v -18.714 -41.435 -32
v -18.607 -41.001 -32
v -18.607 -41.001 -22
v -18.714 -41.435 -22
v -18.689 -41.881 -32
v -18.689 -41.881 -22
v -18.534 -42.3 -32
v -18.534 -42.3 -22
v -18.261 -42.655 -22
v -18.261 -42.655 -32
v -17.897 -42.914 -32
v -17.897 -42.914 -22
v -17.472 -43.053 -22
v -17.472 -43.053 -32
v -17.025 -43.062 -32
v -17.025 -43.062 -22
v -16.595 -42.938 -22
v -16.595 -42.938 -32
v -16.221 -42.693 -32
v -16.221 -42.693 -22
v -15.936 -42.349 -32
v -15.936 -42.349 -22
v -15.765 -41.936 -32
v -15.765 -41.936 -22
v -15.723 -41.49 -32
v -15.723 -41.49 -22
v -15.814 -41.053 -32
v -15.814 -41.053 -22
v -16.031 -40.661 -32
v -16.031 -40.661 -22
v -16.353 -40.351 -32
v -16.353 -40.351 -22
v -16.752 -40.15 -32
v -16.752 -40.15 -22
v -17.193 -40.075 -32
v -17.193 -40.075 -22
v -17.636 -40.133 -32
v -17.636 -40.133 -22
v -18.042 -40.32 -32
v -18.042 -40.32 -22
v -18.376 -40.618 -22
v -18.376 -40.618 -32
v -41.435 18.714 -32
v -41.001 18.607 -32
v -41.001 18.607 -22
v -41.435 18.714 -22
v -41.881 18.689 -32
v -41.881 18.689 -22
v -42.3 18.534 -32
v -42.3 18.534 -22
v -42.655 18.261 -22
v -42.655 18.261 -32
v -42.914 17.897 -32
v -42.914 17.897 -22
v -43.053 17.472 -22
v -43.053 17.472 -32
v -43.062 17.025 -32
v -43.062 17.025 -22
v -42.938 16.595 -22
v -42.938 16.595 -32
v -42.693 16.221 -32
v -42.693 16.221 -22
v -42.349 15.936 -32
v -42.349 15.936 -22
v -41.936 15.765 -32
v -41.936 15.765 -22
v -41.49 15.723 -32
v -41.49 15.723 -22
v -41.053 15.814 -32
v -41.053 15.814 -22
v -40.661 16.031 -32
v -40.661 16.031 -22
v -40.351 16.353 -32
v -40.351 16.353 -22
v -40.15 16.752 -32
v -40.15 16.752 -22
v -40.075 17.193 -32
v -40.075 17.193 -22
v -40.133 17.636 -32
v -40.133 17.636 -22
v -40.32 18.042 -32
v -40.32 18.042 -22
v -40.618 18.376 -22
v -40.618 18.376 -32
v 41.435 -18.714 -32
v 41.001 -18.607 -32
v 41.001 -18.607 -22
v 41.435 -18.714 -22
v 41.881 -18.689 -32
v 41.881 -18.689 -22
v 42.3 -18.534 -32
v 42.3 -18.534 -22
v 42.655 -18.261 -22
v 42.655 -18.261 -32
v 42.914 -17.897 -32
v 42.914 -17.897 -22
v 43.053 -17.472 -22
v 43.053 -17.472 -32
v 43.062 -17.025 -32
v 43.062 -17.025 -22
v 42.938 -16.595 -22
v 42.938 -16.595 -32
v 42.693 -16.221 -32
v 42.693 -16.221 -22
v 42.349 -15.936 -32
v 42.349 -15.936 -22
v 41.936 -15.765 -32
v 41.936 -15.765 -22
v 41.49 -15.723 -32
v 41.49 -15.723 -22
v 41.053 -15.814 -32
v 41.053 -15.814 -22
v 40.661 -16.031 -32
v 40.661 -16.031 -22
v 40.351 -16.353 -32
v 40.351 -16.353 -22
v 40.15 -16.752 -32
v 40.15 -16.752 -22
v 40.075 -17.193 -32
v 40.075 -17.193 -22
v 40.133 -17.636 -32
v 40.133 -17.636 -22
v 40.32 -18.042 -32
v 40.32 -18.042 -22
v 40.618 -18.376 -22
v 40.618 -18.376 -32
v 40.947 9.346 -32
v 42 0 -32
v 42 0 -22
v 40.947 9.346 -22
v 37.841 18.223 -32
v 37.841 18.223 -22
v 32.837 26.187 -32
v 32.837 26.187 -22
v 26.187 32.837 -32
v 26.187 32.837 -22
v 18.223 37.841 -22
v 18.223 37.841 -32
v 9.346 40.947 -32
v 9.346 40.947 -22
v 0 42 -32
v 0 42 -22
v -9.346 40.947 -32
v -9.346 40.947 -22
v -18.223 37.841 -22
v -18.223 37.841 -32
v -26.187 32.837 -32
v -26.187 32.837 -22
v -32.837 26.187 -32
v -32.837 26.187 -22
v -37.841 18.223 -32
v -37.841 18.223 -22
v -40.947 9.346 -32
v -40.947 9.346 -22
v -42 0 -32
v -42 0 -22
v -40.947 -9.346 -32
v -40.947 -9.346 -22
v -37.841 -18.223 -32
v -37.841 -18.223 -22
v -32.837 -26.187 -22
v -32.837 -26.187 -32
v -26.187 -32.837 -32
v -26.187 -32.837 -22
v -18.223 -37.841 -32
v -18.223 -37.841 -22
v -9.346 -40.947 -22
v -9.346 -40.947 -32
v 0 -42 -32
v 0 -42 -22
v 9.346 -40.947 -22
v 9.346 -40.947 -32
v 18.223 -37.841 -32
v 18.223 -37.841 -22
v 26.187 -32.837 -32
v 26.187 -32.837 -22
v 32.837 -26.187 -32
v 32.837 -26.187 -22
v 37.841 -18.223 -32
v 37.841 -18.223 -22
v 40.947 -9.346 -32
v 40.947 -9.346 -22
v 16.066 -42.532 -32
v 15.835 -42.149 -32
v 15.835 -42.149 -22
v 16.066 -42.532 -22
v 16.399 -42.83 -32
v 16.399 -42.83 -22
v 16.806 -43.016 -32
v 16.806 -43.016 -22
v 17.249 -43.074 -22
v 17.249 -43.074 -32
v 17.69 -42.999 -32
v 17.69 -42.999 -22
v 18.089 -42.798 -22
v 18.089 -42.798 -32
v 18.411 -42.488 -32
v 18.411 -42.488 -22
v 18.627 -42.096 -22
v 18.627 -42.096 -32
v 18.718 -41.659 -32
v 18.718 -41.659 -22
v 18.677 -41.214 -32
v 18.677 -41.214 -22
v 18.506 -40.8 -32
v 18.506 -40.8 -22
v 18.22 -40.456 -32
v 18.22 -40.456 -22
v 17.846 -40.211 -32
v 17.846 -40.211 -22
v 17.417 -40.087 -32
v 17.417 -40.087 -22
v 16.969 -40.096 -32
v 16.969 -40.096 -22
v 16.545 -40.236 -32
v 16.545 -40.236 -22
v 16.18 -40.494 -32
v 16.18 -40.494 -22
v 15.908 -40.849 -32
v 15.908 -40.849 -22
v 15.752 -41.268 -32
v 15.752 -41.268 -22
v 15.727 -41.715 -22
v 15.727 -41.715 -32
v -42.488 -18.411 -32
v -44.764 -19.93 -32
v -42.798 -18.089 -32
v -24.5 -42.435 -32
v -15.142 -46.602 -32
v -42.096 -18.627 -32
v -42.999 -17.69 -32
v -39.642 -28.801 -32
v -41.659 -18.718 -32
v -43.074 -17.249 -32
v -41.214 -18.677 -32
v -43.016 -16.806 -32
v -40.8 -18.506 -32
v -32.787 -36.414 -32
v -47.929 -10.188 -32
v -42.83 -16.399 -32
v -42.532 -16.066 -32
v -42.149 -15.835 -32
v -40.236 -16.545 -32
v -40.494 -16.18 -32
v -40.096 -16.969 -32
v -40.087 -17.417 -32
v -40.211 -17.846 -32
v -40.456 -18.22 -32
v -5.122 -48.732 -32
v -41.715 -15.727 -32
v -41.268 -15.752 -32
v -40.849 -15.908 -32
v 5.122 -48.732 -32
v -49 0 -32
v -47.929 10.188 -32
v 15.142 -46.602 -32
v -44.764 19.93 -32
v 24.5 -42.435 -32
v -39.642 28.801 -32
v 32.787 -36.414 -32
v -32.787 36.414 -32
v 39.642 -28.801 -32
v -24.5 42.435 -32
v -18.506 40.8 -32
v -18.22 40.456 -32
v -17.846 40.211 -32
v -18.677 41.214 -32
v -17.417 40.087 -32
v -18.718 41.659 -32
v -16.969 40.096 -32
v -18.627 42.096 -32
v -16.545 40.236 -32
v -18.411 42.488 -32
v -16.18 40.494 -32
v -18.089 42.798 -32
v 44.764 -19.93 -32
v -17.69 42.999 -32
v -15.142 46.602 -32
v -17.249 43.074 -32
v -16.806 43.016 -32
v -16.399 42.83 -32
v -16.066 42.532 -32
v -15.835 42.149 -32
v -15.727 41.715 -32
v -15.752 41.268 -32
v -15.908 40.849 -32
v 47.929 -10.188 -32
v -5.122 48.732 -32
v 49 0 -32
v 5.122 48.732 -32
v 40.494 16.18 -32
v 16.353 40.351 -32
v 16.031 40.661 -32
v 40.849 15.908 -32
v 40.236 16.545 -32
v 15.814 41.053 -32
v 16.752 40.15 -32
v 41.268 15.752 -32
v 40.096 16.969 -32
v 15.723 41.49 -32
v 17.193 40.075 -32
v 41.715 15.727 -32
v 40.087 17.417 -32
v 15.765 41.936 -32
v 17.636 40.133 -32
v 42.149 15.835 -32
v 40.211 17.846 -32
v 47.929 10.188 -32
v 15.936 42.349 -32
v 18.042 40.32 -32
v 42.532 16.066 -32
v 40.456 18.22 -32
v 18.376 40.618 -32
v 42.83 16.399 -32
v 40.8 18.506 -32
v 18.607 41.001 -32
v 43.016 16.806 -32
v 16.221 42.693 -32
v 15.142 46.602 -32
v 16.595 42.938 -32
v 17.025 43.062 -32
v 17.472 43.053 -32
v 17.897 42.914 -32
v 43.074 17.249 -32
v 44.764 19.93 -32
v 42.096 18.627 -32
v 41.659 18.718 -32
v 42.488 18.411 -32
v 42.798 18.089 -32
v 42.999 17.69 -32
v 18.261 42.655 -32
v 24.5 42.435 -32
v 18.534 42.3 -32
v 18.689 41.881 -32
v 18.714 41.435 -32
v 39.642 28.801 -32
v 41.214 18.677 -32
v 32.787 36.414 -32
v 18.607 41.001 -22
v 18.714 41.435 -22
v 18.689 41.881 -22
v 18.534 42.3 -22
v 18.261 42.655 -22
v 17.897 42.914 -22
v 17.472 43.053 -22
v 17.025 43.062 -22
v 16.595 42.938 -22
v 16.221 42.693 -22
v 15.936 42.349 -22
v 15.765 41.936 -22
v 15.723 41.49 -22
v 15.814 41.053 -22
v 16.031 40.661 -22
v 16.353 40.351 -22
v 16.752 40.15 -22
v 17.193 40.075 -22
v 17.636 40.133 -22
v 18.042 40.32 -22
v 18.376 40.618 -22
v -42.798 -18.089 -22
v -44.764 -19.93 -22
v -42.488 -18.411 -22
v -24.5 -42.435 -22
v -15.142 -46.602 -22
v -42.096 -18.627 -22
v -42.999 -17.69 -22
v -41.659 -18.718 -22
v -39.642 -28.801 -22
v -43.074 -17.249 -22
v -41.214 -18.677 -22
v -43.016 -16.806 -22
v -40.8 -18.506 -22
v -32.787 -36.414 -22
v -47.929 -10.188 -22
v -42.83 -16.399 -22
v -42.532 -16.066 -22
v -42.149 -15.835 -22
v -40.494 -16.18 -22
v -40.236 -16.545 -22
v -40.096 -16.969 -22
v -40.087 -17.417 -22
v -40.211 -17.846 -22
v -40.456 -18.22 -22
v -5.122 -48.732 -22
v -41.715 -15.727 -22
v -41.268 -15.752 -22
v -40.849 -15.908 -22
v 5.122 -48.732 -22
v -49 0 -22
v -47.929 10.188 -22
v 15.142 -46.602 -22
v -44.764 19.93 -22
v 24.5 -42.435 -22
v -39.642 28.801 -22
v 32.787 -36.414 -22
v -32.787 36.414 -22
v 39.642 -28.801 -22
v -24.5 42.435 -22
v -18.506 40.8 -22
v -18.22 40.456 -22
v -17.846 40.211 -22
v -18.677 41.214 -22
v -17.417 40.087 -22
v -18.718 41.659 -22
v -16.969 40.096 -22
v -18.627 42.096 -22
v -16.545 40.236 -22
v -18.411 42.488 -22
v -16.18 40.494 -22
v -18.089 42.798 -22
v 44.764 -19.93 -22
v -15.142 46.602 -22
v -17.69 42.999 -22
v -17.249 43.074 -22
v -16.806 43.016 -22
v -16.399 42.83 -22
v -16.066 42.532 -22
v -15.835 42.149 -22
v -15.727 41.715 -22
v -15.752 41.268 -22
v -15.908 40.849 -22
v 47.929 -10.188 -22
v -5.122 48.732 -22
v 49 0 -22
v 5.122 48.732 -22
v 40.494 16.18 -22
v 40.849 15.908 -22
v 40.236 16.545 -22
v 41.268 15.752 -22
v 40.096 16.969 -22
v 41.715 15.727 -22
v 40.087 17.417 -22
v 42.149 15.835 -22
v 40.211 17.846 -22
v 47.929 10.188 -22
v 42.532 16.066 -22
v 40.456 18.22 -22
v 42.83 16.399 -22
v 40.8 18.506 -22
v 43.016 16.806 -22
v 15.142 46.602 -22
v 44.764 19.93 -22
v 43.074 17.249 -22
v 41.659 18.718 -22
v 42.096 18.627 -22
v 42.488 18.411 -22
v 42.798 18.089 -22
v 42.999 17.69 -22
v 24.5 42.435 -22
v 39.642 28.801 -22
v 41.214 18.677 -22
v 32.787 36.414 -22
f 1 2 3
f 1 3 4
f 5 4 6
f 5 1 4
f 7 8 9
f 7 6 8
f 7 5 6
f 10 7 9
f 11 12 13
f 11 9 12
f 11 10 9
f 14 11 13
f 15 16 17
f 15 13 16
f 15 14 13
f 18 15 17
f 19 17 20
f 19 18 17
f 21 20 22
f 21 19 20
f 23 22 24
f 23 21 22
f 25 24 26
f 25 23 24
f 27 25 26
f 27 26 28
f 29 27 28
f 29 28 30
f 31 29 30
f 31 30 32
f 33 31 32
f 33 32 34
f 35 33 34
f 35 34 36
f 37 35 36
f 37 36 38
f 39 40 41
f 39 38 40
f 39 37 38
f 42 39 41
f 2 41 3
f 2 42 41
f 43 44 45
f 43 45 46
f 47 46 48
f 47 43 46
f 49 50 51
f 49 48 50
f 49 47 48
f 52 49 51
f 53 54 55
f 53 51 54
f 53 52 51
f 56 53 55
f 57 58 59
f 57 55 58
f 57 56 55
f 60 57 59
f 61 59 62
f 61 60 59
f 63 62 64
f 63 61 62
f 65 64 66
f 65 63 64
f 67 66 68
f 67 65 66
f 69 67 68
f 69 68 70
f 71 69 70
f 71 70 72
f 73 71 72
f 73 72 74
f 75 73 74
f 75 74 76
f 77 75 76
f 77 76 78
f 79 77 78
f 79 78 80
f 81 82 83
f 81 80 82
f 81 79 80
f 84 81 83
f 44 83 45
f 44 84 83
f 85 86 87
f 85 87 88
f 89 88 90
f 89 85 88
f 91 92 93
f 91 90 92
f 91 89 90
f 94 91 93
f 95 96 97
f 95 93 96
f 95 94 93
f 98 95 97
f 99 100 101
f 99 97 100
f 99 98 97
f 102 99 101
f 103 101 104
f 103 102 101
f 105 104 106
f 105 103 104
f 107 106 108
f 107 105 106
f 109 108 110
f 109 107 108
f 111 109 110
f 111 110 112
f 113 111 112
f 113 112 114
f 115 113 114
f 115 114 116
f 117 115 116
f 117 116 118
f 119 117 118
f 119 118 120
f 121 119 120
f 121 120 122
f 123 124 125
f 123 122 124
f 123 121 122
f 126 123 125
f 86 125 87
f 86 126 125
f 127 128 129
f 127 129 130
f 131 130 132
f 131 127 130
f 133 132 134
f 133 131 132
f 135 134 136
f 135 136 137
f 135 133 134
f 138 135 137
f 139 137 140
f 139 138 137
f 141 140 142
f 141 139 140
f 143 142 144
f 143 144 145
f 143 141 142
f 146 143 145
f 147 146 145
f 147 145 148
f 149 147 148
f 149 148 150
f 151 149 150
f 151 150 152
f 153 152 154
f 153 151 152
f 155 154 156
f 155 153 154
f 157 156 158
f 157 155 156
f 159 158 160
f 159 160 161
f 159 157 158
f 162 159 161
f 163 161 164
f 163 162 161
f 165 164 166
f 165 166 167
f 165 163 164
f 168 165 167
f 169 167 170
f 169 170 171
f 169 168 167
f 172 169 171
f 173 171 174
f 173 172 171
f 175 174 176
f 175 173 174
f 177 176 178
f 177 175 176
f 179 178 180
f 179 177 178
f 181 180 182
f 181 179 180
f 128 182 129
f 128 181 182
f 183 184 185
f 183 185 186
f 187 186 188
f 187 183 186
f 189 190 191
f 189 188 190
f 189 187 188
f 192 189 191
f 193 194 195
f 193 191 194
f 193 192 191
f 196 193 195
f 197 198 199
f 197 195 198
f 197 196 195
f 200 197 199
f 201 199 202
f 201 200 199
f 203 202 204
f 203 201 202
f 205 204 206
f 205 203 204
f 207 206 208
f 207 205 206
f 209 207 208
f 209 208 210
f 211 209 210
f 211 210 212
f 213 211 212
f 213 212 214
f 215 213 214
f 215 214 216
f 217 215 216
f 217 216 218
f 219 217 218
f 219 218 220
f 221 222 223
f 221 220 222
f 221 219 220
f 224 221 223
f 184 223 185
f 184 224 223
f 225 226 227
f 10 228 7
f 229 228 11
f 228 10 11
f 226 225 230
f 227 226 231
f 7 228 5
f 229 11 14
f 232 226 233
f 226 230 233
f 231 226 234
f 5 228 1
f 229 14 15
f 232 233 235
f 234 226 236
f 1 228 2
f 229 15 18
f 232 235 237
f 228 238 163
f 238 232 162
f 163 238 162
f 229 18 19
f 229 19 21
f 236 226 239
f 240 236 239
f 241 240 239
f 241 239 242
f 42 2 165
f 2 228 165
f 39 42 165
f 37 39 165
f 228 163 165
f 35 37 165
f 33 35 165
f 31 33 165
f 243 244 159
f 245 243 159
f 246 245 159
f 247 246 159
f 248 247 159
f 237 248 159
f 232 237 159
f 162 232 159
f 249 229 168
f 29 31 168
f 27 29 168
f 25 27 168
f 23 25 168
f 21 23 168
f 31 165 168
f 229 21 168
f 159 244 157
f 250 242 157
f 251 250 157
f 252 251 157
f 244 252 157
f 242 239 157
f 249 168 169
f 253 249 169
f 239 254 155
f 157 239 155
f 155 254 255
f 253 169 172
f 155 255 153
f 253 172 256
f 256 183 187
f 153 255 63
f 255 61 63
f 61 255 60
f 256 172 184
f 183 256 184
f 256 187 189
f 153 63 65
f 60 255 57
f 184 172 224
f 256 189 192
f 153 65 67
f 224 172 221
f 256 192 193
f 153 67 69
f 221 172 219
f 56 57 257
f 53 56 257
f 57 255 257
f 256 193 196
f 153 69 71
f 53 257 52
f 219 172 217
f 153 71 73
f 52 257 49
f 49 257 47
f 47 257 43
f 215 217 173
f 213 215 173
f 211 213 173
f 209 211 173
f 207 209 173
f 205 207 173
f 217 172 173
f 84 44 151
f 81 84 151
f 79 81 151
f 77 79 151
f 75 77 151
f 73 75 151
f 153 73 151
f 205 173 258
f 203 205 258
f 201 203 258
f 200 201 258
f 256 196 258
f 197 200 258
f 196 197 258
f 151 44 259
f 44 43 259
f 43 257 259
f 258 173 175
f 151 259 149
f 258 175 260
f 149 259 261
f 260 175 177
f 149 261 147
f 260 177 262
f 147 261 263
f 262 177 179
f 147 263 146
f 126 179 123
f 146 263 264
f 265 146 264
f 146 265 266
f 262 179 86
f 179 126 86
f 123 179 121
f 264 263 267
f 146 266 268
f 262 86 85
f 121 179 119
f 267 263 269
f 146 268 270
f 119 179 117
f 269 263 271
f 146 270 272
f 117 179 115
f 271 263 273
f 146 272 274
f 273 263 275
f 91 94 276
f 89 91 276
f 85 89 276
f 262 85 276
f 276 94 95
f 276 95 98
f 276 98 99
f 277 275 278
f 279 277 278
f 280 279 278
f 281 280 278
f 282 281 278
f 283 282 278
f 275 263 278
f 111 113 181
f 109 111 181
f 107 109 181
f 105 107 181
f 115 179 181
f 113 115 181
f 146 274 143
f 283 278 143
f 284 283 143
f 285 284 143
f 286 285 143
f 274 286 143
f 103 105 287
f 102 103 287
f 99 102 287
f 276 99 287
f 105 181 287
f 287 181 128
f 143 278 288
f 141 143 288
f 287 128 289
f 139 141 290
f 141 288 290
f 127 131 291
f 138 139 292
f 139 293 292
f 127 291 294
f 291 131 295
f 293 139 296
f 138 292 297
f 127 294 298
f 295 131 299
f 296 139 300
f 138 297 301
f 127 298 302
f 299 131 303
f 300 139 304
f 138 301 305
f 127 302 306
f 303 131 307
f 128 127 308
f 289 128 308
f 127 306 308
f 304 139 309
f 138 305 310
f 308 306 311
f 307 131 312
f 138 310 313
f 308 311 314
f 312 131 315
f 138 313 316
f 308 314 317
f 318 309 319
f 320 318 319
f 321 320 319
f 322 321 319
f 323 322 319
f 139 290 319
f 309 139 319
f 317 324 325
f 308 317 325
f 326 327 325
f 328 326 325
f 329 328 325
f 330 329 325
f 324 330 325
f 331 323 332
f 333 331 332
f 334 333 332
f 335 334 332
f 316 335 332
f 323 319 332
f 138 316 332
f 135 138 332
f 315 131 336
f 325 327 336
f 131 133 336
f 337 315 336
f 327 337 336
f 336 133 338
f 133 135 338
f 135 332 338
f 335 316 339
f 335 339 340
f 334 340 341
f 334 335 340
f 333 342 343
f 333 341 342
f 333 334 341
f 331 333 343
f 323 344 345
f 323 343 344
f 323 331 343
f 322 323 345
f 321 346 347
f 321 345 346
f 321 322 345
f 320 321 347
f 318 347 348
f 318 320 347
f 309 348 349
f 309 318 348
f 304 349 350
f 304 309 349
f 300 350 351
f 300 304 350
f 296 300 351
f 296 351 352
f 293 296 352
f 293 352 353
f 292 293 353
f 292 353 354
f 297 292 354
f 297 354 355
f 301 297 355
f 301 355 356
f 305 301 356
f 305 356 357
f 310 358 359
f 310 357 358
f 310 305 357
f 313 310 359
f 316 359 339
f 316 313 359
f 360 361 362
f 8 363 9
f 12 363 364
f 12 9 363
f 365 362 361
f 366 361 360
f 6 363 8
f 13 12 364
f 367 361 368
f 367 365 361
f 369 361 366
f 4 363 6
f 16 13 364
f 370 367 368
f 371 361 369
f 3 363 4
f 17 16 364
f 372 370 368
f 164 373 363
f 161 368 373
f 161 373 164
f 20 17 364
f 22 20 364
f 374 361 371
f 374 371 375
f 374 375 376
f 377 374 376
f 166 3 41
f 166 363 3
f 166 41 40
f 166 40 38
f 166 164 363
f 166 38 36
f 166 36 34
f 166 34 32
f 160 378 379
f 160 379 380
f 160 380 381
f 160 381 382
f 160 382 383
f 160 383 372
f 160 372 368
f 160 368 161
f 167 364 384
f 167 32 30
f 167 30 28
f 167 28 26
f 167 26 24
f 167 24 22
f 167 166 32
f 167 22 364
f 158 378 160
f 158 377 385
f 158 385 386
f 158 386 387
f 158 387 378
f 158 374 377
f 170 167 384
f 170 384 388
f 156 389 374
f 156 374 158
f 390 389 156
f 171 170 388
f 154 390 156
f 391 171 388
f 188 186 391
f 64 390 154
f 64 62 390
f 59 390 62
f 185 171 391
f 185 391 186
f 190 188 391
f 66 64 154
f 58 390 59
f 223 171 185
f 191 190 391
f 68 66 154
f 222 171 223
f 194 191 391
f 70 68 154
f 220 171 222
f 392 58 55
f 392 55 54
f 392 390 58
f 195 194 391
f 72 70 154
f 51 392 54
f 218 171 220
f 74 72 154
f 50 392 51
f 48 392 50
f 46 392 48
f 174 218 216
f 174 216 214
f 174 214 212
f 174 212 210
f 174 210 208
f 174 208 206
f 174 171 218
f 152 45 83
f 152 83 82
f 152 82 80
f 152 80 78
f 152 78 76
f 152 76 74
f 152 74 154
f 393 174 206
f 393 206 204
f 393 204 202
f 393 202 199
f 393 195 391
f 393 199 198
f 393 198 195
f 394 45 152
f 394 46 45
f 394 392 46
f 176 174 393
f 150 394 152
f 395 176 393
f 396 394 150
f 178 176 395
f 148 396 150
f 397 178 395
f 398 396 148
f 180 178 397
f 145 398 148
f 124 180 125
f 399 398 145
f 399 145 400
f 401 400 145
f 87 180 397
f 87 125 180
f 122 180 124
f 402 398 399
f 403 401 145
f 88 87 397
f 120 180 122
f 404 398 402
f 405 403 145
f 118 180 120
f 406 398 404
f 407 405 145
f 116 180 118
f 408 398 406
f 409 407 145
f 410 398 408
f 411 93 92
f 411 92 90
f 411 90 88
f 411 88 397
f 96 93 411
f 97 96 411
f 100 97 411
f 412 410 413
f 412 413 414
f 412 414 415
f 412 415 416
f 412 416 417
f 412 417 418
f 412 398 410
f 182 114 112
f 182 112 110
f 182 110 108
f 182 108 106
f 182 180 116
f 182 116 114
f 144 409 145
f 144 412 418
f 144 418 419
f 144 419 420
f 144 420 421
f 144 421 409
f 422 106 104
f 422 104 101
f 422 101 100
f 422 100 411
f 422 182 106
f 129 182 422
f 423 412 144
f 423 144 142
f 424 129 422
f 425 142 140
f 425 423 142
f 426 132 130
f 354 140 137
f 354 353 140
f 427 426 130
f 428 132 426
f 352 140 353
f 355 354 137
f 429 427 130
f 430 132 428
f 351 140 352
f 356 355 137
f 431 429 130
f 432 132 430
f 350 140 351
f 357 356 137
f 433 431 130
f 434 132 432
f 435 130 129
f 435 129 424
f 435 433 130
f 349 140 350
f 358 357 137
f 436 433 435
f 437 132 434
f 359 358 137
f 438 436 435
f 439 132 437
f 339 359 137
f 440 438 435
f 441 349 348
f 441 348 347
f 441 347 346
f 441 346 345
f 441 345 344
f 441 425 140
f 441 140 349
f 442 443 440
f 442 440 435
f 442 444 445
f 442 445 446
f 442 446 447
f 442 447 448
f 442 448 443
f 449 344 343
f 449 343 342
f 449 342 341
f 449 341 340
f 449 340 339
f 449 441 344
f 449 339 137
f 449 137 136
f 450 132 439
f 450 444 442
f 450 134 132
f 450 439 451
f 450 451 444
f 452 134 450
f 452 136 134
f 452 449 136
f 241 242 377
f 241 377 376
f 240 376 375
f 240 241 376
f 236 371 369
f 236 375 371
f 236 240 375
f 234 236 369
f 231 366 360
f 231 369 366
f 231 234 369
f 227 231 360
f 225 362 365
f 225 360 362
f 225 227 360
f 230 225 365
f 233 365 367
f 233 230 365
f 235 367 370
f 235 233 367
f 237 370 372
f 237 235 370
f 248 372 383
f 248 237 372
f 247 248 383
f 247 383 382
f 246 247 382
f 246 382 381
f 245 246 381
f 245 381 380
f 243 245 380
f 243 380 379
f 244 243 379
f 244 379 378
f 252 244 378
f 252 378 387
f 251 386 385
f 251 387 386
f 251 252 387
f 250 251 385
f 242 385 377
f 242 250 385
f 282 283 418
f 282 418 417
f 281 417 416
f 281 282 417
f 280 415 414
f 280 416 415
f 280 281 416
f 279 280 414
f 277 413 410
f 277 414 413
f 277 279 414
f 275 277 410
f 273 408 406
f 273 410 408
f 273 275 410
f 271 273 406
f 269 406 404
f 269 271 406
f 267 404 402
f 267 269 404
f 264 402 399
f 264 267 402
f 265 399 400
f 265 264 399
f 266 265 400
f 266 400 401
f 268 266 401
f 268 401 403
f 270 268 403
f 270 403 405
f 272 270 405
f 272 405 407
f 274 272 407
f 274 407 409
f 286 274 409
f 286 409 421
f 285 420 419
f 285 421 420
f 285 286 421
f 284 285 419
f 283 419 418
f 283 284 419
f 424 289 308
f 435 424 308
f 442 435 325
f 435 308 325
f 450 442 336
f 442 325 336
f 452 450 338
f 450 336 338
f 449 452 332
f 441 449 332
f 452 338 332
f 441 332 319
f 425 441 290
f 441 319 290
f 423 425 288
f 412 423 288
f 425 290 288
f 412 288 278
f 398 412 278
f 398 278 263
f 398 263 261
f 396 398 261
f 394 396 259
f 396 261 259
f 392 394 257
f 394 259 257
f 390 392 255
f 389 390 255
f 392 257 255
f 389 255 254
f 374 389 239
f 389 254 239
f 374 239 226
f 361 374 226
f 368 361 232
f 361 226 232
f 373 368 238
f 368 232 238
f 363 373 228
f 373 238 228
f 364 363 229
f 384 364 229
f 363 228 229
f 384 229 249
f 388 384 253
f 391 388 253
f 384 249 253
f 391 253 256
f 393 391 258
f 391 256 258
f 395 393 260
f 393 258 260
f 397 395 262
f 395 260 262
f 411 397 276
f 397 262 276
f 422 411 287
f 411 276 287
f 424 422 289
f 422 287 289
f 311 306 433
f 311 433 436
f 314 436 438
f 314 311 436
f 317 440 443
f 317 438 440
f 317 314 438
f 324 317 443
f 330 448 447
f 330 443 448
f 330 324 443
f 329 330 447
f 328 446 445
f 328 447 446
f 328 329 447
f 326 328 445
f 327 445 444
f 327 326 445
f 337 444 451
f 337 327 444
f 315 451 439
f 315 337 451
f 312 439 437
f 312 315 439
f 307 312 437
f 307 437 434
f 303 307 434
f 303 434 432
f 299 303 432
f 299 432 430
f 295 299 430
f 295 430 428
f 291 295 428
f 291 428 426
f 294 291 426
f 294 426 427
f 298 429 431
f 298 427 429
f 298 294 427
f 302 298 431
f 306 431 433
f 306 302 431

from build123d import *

# Parameters (mm, degrees)
CYLINDER662_R               = 1.5
CYLINDER662_DEPTH           = 20
CYLINDER662_PLACEMENT_ANGLE = 45
CYLINDER664_R               = 1.5
CYLINDER664_DEPTH           = 20
CYLINDER661_R               = 1.5
CYLINDER661_DEPTH           = 20
CYLINDER661_PLACEMENT_ANGLE = 135
CYLINDER663_R               = 1.5
CYLINDER663_DEPTH           = 20
CYLINDER667_R               = 1.5
CYLINDER667_DEPTH           = 20
CYLINDER667_PLACEMENT_ANGLE = 225
CYLINDER665_R               = 1.5
CYLINDER665_DEPTH           = 20
CYLINDER666_R               = 1.5
CYLINDER666_DEPTH           = 20
CYLINDER666_PLACEMENT_ANGLE = 45
CYLINDER660_R               = 1.5
CYLINDER660_DEPTH           = 20
COMPOUND661_PLACEMENT_ANGLE = 22.5
TUBE041_R                   = 49
TUBE041_R_2                 = 42
TUBE041_DEPTH               = 10


with BuildPart() as v_lec662:
    # Cylinder662 → Cylinder662 (new body)
    with BuildSketch(Plane.XY):
        Circle(CYLINDER662_R)
    extrude(amount=CYLINDER662_DEPTH)


with BuildPart() as v_lec662_1:
    # Cylinder662 placement: moved
    add(v_lec662.part.moved(Location((-31.819805, 31.819805, -18))).rotate(Axis((-31.819805, 31.819805, -18), (0, 0, 1)), CYLINDER662_PLACEMENT_ANGLE))


with BuildPart() as v_lec664:
    # Cylinder664 → Cylinder664 (new body)
    with BuildSketch(Plane(origin=(-45, 0, -18), x_dir=(0, 1, 0), z_dir=(0, 0, 1))):
        Circle(CYLINDER664_R)
    extrude(amount=CYLINDER664_DEPTH)


with BuildPart() as v_lec661:
    # Cylinder661 → Cylinder661 (new body)
    with BuildSketch(Plane.XY):
        Circle(CYLINDER661_R)
    extrude(amount=CYLINDER661_DEPTH)


with BuildPart() as v_lec661_1:
    # Cylinder661 placement: moved
    add(v_lec661.part.moved(Location((-31.819805, -31.819805, -18))).rotate(Axis((-31.819805, -31.819805, -18), (0, 0, 1)), CYLINDER661_PLACEMENT_ANGLE))


with BuildPart() as v_lec663:
    # Cylinder663 → Cylinder663 (new body)
    with BuildSketch(Plane(origin=(0, -45, -18), x_dir=(-1, 0, 0), z_dir=(0, 0, 1))):
        Circle(CYLINDER663_R)
    extrude(amount=CYLINDER663_DEPTH)


with BuildPart() as v_lec667:
    # Cylinder667 → Cylinder667 (new body)
    with BuildSketch(Plane.XY):
        Circle(CYLINDER667_R)
    extrude(amount=CYLINDER667_DEPTH)


with BuildPart() as v_lec667_1:
    # Cylinder667 placement: moved
    add(v_lec667.part.moved(Location((31.819805, -31.819805, -18))).rotate(Axis((31.819805, -31.819805, -18), (0, 0, 1)), CYLINDER667_PLACEMENT_ANGLE))


with BuildPart() as v_lec665:
    # Cylinder665 → Cylinder665 (new body)
    with BuildSketch(Plane(origin=(45, 0, -18), x_dir=(0, -1, 0), z_dir=(0, 0, 1))):
        Circle(CYLINDER665_R)
    extrude(amount=CYLINDER665_DEPTH)


with BuildPart() as v_lec666:
    # Cylinder666 → Cylinder666 (new body)
    with BuildSketch(Plane.XY):
        Circle(CYLINDER666_R)
    extrude(amount=CYLINDER666_DEPTH)


with BuildPart() as v_lec666_1:
    # Cylinder666 placement: moved
    add(v_lec666.part.moved(Location((31.819805, 31.819805, -18))).rotate(Axis((31.819805, 31.819805, -18), (0, 0, -1)), CYLINDER666_PLACEMENT_ANGLE))


with BuildPart() as compound661:
    # Cylinder660 → Cylinder660 (new body)
    with BuildSketch(Plane(origin=(0, 45, -18), x_dir=(1, 0, 0), z_dir=(0, 0, 1))):
        Circle(CYLINDER660_R)
    extrude(amount=CYLINDER660_DEPTH)

    # Compound661: union Válec662, Válec664, Válec661, Válec663, Válec667, Válec665, Válec666
    add(v_lec662_1.part)
    add(v_lec664.part)
    add(v_lec661_1.part)
    add(v_lec663.part)
    add(v_lec667_1.part)
    add(v_lec665.part)
    add(v_lec666_1.part)


with BuildPart() as compound661_1:
    # Compound661 placement: moved
    add(compound661.part.moved(Location((0, 0, -8))).rotate(Axis((0, 0, -8), (0, 0, 1)), COMPOUND661_PLACEMENT_ANGLE))


with BuildPart() as cut291:
    # Tube041 → Tube041 (new body)
    with BuildSketch(Plane.XY.offset(-22)):
        Circle(TUBE041_R)
        Circle(TUBE041_R_2, mode=Mode.SUBTRACT)
    extrude(amount=TUBE041_DEPTH)

    # Cut291: cut Compound661
    add(compound661_1.part, mode=Mode.SUBTRACT)


with BuildPart() as cut291_1:
    # Cut291 placement: moved
    add(cut291.part.moved(Location((0, 0, -10))))


solid = cut291_1.part
